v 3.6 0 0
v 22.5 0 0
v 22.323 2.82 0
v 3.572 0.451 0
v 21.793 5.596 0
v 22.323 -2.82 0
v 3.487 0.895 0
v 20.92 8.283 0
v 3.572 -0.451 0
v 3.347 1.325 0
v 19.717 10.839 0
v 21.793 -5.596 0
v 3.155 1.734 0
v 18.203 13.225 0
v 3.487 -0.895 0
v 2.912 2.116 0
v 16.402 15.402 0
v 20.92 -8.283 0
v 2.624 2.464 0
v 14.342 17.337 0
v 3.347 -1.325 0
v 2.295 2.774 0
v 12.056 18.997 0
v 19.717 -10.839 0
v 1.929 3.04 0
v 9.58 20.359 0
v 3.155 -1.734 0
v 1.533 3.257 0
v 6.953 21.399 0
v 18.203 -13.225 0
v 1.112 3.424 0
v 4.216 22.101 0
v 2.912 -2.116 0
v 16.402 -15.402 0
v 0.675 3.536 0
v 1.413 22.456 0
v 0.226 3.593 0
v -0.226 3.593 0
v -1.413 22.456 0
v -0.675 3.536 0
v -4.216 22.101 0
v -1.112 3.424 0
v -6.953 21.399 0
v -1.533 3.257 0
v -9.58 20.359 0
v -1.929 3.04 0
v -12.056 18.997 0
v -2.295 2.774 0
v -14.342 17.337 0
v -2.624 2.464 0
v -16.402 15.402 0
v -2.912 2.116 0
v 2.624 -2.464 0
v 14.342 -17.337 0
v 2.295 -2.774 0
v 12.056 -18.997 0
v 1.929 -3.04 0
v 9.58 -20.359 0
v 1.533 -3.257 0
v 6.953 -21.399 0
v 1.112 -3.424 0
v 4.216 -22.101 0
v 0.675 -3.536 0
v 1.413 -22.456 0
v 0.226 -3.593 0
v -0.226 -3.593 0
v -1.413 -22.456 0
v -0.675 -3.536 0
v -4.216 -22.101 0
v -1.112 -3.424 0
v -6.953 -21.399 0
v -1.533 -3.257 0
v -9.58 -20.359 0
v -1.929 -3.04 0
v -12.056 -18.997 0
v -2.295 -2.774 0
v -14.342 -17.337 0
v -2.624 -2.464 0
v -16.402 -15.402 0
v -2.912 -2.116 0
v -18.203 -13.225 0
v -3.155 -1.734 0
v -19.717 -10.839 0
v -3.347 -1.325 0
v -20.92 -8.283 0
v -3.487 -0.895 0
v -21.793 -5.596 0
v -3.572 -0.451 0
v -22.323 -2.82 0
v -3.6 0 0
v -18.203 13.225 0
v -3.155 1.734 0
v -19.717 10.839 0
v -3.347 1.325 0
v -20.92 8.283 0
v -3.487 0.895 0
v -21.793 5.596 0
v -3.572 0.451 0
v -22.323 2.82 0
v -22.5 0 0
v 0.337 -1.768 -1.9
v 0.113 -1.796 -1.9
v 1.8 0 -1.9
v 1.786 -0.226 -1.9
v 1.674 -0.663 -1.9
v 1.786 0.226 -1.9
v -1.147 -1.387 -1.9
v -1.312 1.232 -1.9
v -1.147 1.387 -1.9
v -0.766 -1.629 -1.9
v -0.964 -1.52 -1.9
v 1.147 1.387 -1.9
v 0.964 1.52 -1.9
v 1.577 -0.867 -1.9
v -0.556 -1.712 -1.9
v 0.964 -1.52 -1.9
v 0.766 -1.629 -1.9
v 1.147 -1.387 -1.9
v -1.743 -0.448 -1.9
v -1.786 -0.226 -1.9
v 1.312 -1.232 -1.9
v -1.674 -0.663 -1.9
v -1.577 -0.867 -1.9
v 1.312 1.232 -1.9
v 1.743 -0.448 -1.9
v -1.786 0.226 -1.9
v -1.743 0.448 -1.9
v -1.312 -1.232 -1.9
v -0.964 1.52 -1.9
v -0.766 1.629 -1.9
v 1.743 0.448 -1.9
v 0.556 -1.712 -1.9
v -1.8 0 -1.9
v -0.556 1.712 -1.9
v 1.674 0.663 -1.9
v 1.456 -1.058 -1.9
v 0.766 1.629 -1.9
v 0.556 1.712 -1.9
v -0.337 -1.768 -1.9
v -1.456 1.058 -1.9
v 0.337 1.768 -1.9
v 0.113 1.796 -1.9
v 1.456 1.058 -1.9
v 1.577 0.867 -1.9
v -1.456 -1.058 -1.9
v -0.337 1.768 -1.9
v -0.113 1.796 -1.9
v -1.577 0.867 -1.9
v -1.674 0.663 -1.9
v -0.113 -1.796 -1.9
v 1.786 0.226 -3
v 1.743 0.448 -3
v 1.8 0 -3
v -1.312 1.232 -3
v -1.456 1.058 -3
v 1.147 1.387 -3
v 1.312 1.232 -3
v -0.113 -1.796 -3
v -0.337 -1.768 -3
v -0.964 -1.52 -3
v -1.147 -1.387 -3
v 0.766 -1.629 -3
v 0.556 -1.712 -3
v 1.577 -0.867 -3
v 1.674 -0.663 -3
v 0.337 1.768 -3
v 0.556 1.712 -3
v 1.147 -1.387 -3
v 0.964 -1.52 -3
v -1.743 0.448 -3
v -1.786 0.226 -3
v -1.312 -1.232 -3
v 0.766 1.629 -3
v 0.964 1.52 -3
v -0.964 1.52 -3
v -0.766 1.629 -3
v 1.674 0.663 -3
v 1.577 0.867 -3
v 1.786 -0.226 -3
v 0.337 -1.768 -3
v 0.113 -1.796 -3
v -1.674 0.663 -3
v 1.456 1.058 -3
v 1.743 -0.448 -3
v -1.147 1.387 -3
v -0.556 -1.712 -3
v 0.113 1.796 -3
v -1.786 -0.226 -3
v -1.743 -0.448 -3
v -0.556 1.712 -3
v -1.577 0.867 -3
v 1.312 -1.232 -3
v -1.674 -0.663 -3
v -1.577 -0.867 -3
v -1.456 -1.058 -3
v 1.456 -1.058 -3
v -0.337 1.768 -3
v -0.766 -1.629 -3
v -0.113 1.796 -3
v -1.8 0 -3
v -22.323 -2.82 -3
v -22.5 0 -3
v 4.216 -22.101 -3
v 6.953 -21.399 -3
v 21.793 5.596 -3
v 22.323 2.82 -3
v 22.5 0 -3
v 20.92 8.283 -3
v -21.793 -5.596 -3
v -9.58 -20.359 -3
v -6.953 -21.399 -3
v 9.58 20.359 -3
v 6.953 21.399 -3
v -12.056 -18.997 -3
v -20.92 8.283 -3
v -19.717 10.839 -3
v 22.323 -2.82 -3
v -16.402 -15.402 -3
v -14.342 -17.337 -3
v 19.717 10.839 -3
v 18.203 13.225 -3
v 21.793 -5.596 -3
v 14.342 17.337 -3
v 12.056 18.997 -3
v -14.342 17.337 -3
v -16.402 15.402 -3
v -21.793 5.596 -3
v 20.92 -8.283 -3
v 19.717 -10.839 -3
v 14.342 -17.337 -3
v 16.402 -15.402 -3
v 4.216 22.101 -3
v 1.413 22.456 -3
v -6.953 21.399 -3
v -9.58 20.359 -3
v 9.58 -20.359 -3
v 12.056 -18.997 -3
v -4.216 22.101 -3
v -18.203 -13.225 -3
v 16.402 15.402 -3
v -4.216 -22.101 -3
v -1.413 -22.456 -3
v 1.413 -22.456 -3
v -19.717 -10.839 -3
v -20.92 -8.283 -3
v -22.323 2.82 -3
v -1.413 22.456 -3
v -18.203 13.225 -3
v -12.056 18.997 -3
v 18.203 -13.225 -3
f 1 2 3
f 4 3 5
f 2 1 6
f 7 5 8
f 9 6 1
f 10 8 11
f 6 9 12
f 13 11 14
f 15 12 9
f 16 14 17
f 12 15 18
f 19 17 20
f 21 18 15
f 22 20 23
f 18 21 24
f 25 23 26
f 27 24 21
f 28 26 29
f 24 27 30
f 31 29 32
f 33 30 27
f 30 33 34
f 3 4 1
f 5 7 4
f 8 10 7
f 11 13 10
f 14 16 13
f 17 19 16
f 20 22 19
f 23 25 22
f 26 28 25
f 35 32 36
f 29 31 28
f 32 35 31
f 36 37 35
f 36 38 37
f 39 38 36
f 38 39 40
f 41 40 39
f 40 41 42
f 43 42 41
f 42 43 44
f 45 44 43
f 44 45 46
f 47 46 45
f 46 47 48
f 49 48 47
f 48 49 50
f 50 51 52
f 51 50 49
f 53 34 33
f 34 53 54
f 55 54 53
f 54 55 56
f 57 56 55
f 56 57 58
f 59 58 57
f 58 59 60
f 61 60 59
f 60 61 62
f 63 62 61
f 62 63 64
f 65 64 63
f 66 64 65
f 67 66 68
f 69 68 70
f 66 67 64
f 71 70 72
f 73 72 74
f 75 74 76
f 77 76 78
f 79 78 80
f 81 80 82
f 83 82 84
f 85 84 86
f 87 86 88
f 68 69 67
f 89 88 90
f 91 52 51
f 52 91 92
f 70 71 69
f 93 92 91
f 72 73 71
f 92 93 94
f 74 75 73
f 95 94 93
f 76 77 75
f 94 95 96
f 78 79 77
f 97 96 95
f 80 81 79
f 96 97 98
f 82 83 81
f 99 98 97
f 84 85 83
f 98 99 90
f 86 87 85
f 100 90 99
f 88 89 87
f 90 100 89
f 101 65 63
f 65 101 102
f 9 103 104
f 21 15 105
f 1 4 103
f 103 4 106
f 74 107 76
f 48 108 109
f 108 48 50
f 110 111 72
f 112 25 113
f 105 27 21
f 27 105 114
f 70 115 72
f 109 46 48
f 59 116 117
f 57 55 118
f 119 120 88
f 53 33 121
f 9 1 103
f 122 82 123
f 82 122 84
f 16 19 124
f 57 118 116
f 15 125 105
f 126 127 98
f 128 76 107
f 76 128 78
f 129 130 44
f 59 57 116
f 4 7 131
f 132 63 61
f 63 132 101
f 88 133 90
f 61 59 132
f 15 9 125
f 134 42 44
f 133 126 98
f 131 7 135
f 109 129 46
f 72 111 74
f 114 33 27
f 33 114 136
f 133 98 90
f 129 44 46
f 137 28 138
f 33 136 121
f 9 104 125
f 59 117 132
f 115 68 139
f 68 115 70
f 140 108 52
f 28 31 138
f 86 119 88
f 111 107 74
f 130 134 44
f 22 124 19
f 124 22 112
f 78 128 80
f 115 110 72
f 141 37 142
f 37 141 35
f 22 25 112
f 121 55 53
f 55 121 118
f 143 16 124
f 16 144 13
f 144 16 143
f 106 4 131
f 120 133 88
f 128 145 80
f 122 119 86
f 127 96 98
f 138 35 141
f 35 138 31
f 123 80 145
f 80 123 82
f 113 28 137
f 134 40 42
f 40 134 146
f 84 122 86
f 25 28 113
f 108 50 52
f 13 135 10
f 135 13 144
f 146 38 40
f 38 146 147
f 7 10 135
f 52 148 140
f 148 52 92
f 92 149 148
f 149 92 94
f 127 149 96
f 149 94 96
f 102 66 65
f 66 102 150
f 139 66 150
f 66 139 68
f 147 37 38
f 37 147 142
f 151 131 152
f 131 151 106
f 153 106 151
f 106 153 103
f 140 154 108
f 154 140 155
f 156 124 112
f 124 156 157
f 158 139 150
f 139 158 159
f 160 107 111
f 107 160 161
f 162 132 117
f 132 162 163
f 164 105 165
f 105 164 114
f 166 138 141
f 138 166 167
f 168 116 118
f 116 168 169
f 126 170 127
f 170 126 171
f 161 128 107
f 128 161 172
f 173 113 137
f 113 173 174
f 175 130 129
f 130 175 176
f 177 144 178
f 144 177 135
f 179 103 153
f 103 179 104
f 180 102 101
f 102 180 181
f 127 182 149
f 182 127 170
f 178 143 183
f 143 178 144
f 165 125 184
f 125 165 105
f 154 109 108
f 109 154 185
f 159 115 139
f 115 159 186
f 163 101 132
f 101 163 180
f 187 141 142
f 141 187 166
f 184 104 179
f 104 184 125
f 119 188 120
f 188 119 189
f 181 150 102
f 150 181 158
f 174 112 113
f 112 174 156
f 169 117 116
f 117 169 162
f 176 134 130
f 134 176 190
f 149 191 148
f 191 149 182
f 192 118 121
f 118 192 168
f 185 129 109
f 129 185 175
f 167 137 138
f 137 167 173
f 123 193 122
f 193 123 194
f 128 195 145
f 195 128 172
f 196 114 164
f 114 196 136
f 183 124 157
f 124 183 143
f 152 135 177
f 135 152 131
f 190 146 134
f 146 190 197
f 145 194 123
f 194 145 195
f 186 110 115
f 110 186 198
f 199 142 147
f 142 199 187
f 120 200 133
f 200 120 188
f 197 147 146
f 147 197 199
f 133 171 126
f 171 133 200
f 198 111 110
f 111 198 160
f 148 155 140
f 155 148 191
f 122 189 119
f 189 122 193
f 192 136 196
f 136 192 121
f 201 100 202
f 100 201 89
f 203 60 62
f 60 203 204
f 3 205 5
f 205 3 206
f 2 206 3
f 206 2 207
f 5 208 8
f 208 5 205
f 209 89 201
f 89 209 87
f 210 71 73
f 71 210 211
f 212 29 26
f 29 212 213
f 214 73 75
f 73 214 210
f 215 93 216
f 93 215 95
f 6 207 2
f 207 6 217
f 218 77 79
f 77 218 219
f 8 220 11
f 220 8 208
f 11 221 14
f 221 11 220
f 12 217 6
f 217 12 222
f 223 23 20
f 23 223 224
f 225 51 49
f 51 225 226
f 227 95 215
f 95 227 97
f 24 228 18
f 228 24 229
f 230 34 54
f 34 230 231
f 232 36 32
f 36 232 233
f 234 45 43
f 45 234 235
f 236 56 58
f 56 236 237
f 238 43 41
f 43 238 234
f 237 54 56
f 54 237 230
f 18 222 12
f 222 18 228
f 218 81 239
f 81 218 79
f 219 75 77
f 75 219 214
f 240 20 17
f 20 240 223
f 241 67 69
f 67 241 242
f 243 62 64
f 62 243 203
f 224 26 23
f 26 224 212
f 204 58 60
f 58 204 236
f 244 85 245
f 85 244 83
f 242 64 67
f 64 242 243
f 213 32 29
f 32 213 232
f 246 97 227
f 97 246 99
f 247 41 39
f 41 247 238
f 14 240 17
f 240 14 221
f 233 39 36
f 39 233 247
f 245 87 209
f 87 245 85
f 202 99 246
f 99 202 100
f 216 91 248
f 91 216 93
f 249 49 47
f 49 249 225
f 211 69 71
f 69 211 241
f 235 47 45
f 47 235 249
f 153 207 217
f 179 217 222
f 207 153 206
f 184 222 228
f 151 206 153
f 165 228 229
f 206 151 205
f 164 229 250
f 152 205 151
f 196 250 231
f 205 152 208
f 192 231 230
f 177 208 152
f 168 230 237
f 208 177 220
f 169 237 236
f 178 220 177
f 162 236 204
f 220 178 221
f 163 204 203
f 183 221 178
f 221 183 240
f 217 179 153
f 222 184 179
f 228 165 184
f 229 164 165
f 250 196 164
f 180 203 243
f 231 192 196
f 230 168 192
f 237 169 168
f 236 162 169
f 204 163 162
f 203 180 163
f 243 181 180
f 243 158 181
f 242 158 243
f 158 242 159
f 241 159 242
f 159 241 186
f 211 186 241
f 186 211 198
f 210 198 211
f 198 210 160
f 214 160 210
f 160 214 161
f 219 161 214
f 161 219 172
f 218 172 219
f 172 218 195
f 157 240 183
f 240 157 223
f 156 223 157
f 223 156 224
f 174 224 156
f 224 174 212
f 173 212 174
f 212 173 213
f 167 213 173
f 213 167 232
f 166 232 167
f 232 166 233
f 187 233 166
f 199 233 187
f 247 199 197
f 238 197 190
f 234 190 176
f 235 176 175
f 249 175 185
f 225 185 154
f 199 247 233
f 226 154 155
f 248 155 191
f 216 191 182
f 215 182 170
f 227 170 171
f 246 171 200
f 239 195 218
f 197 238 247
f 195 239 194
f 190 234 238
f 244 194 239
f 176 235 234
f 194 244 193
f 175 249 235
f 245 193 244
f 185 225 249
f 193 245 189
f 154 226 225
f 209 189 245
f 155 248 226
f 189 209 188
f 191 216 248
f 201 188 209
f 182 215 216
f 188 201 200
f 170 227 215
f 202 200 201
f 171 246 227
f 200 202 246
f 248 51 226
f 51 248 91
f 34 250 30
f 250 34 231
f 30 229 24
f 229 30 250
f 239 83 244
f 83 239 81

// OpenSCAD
$fn = 50;

difference() {
	union() {
		translate(v = [0, 0, -3.0]) {
			cylinder(h = 3, r = 22.5);
		}
	}
	union() {
		translate(v = [0, 0, 0]) {
			rotate(a = [0, 0, 0]) {
				difference() {
					union() {
						translate(v = [0, 0, -6.0]) {
							cylinder(h = 6, r = 1.5);
						}
						translate(v = [0, 0, -1.9]) {
							cylinder(h = 1.9, r1 = 1.8, r2 = 3.6);
						}
						translate(v = [0, 0, -6.0]) {
							cylinder(h = 6, r = 1.8);
						}
						translate(v = [0, 0, -6.0]) {
							cylinder(h = 6, r = 1.5);
						}
					}
					union();
				}
			}
		}
	}
}
